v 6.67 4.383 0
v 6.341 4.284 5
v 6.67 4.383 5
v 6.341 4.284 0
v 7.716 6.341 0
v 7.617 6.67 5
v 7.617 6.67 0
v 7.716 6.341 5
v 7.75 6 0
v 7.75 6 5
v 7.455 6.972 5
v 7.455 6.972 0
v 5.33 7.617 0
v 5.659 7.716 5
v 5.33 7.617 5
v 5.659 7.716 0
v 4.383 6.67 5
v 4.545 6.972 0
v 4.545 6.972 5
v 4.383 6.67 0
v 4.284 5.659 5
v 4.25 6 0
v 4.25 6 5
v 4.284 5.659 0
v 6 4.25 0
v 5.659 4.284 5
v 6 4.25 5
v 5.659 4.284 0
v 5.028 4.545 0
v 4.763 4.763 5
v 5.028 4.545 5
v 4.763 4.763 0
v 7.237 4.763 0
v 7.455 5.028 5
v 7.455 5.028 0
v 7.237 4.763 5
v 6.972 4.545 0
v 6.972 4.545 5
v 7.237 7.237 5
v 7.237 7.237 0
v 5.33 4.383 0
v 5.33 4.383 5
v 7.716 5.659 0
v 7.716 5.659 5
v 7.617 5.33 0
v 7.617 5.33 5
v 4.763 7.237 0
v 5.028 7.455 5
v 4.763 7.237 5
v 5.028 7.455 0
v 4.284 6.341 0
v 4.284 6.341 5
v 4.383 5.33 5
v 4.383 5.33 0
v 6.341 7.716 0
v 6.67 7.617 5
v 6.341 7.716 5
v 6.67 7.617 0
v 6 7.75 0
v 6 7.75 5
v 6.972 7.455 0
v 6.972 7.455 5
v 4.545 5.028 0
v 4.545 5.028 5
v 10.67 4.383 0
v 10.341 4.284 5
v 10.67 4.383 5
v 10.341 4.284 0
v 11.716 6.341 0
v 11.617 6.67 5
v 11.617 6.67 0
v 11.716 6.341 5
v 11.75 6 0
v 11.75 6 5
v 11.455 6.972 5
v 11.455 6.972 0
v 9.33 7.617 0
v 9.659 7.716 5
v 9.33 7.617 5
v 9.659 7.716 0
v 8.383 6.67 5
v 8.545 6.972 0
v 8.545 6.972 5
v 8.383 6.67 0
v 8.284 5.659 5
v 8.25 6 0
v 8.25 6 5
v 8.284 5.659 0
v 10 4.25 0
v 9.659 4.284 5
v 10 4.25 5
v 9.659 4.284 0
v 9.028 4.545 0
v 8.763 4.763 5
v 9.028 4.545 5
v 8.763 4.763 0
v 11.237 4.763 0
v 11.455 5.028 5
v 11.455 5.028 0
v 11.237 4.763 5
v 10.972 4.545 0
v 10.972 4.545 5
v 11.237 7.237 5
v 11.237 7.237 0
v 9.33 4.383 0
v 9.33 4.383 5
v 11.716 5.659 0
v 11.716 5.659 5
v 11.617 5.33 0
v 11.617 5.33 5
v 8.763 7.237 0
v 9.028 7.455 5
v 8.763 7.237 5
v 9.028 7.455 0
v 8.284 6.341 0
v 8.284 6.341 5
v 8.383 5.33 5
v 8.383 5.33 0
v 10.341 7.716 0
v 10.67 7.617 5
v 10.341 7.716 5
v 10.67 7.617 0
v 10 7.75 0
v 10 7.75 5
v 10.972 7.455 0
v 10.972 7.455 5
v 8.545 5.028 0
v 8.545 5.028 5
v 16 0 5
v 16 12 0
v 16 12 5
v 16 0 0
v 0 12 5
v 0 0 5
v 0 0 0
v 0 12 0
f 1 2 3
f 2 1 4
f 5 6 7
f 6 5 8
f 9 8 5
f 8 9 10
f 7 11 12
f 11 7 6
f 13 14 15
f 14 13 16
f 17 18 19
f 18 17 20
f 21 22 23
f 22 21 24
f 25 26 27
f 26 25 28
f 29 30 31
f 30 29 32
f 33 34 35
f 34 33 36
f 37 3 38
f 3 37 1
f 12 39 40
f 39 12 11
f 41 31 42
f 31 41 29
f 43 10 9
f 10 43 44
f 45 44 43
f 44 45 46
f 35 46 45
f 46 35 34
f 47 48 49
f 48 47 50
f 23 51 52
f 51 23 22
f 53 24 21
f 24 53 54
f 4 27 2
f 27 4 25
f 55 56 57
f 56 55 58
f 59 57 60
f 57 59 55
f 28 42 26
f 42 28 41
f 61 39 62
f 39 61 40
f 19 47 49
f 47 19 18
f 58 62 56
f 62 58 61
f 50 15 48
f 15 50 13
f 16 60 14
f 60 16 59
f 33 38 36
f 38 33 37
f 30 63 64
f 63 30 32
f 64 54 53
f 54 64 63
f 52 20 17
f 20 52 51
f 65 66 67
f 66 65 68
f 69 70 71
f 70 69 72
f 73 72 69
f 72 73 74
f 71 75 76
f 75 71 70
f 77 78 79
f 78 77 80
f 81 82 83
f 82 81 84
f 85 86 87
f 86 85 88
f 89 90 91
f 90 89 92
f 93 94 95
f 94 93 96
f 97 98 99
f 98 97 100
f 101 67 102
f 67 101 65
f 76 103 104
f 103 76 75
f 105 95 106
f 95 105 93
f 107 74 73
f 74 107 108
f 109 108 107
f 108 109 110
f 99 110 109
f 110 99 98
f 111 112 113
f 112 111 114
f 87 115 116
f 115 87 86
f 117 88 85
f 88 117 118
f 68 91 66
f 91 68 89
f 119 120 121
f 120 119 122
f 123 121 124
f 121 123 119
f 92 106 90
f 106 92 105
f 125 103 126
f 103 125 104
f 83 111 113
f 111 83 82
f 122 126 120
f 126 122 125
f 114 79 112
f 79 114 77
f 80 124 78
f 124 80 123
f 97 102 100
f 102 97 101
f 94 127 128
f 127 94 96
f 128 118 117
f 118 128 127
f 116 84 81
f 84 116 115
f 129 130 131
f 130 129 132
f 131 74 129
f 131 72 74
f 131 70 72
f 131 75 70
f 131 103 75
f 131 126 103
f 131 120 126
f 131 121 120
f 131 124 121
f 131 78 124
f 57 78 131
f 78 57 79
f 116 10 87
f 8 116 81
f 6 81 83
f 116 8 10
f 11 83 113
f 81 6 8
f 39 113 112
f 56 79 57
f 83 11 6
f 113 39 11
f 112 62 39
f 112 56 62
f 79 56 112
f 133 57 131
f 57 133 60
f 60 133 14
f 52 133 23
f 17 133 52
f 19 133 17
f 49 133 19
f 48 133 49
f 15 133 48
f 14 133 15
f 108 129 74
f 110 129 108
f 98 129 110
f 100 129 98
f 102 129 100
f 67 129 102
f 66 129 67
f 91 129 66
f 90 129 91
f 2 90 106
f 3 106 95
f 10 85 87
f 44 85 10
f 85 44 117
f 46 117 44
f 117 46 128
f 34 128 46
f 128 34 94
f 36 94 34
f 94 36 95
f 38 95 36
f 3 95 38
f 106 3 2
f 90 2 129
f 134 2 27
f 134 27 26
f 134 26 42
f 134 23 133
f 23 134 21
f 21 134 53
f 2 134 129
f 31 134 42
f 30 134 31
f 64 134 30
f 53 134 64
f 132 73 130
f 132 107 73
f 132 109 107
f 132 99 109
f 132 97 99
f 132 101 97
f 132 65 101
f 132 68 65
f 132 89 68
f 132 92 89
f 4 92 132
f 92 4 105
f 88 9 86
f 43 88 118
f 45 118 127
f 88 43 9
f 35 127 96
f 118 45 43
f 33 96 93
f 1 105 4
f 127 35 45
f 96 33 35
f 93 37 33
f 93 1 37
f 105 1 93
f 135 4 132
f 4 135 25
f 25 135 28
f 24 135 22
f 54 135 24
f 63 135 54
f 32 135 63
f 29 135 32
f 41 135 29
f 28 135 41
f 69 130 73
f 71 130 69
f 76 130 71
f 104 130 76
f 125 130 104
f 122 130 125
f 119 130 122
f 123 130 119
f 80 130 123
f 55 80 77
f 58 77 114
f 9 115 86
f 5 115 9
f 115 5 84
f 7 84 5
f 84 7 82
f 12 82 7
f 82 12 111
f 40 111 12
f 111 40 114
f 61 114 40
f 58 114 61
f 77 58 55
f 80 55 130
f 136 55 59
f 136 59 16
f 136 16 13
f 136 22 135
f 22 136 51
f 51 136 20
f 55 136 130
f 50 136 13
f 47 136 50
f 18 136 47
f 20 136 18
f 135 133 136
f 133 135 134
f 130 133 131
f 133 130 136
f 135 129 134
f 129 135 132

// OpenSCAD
$fn = 32;

// ----------------------------------------------------------------------
// Micro pad: two-hole pad, 5-20 mm class
// ----------------------------------------------------------------------

// --- parameters (mm) ---
pad_l = 16;               // pad length, X
pad_w = 12;               // pad width, Y
pad_t = 5;                // pad thickness, Z
hole_d = 3.5;             // hole diameter
hole_x = 6;               // X of the first hole centre

difference() {
  cube([pad_l, pad_w, pad_t]);
  for (x = [hole_x, pad_l - hole_x])
    translate([x, pad_w / 2, -1])
      cylinder(h = pad_t + 2, d = hole_d);
}
